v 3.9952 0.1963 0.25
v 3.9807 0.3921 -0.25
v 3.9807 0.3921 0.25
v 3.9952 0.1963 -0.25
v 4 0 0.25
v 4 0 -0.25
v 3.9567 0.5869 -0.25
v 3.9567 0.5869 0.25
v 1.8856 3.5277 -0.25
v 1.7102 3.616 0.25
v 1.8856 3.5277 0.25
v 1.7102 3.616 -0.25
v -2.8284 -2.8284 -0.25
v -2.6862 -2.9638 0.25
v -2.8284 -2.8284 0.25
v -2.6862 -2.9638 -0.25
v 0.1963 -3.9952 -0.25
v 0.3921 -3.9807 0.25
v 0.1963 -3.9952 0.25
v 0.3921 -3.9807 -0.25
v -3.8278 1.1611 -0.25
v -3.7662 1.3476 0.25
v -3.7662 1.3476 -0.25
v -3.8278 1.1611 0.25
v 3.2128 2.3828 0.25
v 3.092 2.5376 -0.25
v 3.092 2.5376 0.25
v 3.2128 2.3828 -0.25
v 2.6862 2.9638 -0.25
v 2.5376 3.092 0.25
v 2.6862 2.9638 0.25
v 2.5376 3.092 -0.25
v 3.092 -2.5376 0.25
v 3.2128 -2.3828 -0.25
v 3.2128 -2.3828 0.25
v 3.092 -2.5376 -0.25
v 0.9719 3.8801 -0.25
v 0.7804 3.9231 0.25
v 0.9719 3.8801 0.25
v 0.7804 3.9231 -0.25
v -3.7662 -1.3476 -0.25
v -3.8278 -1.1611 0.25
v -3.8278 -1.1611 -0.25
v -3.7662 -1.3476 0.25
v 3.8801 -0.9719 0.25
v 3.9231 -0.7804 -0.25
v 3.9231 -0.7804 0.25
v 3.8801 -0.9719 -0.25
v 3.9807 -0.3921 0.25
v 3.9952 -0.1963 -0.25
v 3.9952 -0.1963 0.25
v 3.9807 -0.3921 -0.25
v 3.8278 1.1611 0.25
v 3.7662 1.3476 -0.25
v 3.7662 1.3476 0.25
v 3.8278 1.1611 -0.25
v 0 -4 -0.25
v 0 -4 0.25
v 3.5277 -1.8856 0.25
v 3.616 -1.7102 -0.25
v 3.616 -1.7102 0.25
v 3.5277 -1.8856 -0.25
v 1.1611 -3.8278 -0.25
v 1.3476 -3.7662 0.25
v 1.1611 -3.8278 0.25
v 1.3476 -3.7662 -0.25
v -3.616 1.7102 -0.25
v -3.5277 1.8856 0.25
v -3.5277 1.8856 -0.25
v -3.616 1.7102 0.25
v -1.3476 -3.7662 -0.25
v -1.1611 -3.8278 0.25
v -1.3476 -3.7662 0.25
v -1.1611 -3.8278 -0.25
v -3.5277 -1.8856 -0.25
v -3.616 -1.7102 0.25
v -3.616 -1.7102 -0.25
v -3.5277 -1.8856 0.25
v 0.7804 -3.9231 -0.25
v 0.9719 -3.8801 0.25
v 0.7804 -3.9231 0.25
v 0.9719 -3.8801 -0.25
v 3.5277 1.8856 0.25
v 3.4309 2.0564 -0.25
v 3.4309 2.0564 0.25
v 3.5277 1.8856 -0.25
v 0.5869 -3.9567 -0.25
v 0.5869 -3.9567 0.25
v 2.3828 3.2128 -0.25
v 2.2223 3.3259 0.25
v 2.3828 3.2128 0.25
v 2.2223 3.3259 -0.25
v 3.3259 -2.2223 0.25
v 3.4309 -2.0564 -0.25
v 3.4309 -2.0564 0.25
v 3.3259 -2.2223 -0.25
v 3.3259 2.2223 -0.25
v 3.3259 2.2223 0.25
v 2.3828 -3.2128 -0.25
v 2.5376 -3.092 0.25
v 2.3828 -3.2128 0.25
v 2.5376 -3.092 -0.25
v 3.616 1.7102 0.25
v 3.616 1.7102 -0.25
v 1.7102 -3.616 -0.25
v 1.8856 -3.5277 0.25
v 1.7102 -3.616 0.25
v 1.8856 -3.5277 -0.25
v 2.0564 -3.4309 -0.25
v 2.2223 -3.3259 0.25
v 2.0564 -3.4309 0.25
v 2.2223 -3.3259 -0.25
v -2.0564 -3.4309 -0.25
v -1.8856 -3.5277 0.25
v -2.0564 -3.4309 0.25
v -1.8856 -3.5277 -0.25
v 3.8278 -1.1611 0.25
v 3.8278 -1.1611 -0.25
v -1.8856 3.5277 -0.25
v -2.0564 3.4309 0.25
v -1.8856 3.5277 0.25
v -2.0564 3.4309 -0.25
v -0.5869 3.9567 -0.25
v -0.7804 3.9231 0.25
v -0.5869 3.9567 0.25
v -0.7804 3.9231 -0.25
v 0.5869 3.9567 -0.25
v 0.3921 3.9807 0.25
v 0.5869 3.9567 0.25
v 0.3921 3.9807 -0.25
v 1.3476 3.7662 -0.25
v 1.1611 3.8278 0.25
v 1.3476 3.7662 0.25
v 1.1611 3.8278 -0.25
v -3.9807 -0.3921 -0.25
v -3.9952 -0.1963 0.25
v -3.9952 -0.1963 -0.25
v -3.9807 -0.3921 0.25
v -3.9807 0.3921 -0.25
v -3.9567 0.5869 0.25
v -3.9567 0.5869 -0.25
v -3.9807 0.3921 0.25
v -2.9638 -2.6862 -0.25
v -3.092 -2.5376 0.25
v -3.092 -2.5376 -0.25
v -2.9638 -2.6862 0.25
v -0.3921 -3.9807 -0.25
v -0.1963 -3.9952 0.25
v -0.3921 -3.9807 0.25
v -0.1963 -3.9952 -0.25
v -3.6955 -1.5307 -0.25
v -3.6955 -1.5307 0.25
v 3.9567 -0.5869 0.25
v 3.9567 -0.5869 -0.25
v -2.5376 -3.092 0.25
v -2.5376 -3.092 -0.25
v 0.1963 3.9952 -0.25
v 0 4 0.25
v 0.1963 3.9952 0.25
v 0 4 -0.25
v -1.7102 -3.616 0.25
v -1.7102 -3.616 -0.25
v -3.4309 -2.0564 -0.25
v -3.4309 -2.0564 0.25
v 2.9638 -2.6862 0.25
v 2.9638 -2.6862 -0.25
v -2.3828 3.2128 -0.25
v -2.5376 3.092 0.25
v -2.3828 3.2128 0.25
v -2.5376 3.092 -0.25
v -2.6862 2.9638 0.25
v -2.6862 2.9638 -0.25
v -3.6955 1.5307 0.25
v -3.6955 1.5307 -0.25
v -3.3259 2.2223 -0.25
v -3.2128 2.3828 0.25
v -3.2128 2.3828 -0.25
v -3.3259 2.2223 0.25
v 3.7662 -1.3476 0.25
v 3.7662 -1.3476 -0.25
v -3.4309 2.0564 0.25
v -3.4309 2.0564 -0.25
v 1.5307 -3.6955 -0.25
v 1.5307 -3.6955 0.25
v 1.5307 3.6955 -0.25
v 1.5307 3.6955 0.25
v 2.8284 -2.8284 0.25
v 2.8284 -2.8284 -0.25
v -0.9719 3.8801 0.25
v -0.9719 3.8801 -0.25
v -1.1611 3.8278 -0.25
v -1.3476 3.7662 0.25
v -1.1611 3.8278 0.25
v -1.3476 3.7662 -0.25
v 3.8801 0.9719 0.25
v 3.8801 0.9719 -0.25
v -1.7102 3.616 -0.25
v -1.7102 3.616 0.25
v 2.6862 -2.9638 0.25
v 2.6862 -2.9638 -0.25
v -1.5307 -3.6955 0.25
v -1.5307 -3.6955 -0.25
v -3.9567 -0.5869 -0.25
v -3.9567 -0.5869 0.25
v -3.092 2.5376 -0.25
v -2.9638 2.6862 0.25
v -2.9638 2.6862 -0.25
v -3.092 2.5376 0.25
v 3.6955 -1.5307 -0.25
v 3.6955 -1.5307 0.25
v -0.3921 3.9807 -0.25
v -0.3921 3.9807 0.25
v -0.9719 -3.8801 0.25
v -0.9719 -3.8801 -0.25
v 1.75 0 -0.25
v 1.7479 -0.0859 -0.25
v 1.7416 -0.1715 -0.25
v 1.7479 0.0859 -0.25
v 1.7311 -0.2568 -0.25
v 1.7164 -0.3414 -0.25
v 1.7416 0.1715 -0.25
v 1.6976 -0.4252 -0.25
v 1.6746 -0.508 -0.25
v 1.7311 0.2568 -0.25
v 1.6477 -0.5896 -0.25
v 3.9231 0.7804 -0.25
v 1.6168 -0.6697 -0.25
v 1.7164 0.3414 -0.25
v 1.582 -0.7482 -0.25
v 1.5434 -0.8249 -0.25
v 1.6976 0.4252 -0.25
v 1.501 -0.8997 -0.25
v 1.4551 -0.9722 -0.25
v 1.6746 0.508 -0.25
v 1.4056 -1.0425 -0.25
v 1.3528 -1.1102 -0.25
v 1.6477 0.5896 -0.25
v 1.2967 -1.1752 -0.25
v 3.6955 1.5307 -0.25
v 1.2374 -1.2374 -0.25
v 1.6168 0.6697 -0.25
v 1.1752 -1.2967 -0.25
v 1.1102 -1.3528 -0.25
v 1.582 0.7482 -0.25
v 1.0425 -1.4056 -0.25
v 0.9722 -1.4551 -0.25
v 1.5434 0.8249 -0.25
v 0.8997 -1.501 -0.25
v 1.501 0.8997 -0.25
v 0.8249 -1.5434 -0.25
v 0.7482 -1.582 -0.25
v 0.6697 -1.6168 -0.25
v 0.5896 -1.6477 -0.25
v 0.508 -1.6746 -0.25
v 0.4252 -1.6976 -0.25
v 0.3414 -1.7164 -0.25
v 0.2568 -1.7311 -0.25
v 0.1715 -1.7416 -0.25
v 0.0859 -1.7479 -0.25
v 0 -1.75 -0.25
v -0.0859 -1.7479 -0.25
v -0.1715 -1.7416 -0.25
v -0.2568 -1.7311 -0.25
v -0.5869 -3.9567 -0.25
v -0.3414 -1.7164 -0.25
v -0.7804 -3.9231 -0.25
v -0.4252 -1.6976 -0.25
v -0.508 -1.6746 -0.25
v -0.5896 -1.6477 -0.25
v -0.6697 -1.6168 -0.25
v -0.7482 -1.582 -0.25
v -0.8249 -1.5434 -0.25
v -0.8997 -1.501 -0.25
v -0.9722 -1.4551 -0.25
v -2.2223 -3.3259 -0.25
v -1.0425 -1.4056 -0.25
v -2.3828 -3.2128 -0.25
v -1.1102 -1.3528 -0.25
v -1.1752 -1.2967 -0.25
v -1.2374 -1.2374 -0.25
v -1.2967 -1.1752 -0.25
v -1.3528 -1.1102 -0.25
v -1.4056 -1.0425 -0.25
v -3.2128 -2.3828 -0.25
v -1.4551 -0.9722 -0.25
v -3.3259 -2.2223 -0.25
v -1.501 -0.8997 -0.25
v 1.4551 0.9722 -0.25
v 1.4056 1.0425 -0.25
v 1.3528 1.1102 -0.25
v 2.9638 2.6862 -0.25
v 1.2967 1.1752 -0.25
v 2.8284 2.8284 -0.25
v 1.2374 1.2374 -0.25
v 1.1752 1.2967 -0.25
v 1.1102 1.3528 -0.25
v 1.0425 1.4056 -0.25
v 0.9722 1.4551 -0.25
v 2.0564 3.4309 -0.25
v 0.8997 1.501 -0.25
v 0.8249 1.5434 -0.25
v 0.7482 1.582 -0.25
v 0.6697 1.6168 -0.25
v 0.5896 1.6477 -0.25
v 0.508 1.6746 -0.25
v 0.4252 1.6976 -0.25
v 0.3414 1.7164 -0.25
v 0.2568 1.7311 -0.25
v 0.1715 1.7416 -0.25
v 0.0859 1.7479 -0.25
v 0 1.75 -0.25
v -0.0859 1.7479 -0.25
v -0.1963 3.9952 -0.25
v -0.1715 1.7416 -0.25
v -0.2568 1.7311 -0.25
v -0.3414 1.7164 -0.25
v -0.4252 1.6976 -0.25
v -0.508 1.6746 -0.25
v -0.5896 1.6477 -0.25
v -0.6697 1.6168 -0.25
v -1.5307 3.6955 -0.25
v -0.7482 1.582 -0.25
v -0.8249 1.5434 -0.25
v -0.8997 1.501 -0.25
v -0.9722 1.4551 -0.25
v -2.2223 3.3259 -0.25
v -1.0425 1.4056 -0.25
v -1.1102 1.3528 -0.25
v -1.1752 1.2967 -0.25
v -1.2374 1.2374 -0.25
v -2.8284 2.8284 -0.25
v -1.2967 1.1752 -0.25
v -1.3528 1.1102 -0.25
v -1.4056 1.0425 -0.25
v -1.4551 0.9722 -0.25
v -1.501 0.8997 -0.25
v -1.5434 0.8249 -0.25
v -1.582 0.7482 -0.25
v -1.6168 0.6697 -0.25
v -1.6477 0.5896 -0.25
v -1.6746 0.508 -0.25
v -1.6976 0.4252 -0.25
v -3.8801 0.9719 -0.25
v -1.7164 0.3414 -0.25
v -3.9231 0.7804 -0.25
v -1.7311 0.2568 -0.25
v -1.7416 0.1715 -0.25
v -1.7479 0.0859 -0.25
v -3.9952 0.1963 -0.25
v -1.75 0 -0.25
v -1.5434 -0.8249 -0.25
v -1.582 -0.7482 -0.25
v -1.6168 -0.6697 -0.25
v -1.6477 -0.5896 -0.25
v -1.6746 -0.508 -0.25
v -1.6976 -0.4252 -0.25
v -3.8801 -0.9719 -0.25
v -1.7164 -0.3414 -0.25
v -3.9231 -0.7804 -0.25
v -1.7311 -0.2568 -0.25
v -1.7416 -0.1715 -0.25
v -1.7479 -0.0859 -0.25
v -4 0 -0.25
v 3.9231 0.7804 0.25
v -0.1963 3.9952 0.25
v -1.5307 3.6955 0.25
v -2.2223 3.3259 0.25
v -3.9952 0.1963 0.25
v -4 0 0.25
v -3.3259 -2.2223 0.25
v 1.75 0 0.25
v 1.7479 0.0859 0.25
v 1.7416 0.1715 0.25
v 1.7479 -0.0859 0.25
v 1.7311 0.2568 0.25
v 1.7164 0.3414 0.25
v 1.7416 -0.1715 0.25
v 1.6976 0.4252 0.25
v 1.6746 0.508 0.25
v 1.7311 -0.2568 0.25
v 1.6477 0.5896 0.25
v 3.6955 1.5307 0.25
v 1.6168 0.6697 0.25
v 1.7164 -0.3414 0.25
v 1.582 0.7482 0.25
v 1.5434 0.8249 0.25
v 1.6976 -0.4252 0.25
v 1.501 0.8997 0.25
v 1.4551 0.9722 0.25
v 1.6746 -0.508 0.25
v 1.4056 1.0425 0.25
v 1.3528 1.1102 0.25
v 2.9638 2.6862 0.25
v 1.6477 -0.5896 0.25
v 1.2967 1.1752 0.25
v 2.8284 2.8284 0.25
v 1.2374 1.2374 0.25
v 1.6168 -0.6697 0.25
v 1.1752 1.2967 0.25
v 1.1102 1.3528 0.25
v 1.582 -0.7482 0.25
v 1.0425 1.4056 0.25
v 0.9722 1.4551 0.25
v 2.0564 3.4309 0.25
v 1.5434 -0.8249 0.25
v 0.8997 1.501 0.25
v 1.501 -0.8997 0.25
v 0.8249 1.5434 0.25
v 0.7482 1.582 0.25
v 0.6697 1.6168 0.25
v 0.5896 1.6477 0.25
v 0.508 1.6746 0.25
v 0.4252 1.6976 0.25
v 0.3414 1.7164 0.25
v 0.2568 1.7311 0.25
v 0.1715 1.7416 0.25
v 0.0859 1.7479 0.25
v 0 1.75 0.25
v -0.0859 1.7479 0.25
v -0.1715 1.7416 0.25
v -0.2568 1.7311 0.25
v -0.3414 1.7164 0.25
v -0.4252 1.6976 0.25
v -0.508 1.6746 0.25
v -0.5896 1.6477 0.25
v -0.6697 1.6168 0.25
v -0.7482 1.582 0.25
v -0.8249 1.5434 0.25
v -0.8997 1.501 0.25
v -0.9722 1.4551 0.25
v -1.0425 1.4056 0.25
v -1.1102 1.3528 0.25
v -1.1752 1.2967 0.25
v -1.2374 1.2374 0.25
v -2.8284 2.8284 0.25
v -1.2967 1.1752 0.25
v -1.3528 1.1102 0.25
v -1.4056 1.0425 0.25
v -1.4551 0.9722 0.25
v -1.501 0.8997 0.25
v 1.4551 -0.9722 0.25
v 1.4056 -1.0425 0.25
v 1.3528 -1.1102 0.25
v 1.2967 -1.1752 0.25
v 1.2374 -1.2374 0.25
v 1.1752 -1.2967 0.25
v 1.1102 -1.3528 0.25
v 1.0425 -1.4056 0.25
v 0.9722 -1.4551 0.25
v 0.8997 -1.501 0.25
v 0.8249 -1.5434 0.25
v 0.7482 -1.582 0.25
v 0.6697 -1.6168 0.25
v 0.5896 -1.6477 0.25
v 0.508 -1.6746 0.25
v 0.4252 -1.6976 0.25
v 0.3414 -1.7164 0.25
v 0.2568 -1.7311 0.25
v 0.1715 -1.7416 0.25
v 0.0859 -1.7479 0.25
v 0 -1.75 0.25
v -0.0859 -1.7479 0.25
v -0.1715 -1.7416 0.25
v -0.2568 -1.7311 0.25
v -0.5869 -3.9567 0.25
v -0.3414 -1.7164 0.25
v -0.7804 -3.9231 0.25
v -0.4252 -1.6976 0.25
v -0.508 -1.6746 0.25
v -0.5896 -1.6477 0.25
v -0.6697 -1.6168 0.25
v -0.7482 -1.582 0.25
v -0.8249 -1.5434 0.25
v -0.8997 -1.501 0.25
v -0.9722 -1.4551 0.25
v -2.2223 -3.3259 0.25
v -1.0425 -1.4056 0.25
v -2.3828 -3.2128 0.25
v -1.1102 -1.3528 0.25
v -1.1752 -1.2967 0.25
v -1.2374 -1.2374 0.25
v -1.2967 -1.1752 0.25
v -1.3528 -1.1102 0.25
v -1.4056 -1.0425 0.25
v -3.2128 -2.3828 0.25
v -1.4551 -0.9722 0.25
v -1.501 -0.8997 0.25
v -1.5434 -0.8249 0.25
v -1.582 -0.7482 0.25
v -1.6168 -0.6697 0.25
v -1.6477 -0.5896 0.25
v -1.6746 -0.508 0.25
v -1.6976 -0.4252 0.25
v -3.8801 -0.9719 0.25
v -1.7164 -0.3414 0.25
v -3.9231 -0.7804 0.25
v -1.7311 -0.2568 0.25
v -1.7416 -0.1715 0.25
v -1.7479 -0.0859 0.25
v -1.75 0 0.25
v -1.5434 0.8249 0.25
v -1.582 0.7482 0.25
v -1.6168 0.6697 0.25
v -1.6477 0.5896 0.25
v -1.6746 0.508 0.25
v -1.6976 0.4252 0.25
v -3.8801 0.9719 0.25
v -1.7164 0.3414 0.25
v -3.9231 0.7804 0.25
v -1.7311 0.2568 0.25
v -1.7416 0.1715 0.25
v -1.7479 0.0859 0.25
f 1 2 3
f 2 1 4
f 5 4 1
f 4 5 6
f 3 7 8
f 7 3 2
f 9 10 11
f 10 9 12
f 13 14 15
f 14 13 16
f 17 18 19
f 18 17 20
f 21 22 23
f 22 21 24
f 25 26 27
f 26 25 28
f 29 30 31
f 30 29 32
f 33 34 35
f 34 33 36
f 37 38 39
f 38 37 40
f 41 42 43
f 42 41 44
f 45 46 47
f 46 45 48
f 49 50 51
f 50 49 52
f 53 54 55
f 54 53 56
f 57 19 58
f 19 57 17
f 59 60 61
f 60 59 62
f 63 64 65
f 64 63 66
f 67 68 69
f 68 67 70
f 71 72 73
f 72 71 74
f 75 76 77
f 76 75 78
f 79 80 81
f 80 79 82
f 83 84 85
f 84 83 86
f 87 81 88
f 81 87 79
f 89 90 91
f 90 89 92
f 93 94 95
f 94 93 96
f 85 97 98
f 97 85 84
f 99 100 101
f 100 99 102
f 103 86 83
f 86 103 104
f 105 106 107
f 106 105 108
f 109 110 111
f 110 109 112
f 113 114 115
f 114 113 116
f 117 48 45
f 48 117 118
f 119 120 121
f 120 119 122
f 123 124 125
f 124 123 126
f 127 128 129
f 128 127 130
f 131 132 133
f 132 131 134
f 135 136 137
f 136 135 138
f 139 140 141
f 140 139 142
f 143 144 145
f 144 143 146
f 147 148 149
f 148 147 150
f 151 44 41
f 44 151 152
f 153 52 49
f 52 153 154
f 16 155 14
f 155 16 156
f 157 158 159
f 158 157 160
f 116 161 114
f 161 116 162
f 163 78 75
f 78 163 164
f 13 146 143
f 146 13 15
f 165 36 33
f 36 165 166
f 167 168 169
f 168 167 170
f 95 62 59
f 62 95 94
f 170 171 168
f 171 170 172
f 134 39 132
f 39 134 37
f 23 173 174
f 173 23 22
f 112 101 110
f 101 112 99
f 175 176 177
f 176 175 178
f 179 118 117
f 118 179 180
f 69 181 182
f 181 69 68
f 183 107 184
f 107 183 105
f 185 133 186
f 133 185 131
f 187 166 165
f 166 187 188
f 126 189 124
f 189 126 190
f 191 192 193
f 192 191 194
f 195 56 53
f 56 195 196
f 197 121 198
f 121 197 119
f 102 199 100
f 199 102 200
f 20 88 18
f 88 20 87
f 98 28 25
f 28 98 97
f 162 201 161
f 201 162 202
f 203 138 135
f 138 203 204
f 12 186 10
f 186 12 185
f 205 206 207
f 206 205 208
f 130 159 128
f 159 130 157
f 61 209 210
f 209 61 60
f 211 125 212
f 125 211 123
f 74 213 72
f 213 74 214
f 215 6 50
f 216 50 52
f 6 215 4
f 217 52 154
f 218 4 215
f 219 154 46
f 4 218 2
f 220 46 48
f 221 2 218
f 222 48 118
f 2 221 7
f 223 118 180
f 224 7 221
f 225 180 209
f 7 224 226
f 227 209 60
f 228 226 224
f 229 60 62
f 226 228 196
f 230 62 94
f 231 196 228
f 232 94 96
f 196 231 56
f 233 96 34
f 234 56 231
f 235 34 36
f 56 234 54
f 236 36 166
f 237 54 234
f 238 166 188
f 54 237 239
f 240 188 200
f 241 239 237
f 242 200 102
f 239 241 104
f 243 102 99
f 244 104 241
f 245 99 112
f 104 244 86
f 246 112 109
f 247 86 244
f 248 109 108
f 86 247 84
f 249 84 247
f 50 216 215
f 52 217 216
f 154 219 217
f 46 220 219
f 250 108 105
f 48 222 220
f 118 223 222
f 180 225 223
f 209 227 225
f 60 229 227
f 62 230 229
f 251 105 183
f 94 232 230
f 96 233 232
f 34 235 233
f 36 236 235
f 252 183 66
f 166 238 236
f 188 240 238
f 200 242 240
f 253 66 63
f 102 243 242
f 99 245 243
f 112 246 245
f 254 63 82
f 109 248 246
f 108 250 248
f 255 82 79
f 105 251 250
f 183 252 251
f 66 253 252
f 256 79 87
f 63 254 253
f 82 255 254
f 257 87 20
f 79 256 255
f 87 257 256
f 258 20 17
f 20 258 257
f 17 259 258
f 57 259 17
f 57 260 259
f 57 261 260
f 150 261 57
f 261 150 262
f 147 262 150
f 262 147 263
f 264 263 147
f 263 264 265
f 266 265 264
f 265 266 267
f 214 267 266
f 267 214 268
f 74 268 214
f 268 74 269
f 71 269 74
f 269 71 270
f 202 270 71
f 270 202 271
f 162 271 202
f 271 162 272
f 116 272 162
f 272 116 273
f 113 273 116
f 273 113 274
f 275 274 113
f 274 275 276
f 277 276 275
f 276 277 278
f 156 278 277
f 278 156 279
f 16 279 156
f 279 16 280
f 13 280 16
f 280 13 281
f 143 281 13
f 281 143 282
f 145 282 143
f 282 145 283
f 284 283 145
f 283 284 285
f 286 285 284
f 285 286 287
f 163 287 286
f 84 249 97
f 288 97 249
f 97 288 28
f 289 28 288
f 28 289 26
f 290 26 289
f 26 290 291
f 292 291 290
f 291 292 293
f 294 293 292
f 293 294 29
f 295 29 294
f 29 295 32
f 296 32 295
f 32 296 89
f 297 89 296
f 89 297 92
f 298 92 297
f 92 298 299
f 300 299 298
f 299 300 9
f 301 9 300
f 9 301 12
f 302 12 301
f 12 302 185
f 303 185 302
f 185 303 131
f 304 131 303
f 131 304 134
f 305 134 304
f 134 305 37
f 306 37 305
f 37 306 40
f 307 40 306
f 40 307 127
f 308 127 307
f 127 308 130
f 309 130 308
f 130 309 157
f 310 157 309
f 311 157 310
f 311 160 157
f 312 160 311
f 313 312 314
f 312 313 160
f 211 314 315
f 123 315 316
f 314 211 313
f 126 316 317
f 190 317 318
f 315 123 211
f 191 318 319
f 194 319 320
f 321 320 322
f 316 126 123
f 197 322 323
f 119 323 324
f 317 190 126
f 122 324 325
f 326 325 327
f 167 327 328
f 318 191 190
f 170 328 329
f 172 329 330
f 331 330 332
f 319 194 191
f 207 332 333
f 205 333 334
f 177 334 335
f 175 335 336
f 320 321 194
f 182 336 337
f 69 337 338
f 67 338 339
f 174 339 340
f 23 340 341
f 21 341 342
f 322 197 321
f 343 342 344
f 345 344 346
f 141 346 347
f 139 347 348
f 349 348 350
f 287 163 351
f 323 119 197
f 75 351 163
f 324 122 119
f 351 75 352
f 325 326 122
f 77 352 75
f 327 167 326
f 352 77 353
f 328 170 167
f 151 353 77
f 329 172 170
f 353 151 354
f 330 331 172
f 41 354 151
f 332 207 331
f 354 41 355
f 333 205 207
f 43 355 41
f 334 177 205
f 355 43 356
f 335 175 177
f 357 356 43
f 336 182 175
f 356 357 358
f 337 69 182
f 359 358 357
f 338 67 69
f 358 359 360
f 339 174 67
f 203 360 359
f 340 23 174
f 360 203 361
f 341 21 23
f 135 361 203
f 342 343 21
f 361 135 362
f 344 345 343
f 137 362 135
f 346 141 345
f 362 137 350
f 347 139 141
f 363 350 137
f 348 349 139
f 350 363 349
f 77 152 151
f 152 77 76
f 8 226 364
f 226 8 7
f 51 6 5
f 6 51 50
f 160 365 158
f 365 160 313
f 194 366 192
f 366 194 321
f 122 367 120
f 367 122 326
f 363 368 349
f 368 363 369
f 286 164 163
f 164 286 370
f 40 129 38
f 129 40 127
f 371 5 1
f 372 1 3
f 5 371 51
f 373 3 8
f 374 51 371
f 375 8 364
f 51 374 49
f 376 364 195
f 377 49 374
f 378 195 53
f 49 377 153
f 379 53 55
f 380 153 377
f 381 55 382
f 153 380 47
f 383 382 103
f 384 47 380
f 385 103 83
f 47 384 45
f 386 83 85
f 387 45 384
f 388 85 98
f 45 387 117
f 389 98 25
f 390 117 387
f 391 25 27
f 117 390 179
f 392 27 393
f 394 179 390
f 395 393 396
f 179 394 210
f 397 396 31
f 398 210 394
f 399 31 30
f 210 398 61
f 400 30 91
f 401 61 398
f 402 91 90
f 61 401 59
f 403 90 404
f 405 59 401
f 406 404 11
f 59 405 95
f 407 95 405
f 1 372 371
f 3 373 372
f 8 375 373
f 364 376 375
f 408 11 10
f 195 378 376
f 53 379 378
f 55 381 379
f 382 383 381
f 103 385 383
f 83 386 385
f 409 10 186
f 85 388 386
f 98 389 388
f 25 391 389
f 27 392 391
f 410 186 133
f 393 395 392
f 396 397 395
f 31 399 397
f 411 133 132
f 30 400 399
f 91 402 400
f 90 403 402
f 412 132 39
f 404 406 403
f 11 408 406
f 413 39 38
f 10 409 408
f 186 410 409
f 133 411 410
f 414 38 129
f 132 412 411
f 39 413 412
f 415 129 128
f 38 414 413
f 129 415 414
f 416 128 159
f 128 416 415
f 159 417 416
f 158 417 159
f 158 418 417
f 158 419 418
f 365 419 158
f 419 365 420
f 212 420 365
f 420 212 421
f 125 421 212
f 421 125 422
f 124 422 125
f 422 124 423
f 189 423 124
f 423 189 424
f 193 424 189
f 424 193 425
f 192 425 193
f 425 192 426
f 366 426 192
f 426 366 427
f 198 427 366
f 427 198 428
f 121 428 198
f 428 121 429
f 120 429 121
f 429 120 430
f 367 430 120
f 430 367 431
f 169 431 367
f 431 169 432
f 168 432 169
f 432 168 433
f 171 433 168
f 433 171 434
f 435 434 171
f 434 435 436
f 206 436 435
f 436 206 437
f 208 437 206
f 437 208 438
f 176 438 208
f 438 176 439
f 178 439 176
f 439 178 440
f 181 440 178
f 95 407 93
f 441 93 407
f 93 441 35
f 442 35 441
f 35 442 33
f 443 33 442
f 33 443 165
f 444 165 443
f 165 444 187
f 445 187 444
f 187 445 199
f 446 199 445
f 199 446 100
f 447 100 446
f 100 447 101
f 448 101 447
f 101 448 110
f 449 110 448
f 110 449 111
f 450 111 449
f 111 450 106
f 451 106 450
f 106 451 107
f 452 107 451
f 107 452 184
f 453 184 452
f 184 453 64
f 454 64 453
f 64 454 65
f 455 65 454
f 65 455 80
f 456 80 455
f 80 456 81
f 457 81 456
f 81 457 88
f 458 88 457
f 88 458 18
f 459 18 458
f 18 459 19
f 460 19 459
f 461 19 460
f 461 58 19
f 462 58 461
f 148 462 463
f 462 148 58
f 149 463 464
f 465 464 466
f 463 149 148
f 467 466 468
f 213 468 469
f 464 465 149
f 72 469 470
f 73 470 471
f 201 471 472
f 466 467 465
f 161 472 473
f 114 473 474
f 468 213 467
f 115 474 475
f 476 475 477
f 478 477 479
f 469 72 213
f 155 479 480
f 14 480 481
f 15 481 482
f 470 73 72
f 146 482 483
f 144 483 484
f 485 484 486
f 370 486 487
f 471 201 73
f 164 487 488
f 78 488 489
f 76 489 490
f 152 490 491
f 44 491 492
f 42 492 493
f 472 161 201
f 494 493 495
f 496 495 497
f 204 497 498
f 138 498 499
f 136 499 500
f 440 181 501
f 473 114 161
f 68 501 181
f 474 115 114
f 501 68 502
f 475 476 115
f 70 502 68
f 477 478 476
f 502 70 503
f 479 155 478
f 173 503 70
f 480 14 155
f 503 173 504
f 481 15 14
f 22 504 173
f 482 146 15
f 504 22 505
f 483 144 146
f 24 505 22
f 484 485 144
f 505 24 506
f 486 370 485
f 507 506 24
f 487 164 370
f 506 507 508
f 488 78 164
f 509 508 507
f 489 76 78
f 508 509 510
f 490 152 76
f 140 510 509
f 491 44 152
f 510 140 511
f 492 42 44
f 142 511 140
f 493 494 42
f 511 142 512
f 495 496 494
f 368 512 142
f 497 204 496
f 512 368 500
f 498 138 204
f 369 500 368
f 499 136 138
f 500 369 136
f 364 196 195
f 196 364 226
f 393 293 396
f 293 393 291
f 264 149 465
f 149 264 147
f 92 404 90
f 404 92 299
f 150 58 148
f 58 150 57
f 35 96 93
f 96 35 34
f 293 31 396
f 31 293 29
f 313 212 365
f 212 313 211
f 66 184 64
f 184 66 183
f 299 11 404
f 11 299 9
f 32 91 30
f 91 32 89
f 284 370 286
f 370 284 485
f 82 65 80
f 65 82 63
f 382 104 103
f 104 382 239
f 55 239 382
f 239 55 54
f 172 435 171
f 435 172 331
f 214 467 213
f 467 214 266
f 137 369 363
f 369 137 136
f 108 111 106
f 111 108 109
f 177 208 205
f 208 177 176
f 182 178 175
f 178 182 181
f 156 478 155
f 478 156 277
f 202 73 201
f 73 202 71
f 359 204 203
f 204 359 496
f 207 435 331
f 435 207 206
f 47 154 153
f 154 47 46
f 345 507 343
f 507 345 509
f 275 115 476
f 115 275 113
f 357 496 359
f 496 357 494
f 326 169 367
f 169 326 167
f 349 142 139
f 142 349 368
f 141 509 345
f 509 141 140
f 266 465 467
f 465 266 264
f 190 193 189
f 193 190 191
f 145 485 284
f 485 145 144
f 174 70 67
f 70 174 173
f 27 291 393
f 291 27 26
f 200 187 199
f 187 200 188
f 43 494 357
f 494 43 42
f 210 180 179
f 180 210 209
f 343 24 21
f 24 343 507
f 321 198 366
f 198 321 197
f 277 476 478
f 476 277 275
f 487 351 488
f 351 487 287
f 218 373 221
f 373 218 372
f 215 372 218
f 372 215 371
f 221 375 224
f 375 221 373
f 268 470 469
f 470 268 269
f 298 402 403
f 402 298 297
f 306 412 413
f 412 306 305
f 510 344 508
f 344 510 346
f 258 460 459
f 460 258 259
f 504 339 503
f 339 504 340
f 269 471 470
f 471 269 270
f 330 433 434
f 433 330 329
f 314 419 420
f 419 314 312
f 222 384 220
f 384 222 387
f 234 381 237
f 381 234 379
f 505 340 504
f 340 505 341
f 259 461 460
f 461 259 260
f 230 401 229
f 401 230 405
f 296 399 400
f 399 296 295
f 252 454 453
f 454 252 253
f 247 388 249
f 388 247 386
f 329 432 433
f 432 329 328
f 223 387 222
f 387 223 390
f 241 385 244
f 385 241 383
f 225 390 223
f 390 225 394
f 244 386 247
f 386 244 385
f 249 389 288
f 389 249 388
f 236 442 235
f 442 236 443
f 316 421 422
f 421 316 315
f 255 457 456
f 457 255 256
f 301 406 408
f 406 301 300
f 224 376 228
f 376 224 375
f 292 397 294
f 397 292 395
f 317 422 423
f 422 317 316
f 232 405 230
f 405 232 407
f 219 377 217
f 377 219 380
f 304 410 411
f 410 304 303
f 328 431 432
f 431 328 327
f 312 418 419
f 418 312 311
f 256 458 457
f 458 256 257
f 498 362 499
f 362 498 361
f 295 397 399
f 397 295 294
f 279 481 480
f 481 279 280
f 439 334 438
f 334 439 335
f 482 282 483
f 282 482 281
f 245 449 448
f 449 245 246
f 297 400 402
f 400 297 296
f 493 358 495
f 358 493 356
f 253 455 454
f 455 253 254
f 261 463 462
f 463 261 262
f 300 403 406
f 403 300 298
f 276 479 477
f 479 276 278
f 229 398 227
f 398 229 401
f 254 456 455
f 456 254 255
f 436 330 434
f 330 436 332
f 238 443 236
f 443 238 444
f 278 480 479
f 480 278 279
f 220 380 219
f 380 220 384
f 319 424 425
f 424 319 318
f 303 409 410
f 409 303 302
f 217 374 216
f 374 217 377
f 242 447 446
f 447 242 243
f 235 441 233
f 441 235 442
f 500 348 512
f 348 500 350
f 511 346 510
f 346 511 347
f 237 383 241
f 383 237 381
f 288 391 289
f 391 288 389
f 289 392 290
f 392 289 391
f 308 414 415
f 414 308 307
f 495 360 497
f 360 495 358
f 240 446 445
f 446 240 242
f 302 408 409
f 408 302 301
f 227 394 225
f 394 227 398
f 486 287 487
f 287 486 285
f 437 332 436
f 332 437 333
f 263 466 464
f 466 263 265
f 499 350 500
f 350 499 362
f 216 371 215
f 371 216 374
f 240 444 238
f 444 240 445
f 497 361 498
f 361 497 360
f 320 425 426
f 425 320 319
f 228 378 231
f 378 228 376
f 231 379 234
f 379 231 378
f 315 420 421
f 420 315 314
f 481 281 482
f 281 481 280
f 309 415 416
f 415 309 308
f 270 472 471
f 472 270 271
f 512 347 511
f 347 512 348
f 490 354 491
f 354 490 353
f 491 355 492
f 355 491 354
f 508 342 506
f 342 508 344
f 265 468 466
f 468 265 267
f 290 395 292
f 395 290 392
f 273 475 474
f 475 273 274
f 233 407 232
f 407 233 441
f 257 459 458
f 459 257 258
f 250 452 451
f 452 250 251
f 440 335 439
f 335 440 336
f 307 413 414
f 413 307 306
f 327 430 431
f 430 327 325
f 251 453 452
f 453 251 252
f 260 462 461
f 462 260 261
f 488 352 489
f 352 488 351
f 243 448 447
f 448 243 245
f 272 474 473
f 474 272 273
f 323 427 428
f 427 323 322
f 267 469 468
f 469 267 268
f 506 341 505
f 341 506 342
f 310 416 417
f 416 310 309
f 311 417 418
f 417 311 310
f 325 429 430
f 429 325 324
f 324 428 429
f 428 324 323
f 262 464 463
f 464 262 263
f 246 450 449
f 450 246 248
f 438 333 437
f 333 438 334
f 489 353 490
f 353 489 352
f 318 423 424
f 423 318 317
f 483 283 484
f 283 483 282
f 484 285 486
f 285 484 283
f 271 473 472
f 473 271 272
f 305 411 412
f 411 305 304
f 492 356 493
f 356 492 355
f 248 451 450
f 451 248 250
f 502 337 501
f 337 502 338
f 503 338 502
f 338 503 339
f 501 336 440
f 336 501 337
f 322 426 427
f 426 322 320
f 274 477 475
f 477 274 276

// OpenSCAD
// Flat washer parameters (mm)
inner_hole_diameter_mm = 3.5;  //[1.75:7:0.1]
outer_diameter_mm      = 8.0;  //[4:16:0.1]
thickness_mm           = 0.5;  //[0.25:1:0.05]
eps_mm                 = 0.2;  //[0.05:0.5:0.05]

// Smoothness (avoid faceted look)
$fn = 128;

module washer() {
    difference() {
        cylinder(d=outer_diameter_mm, h=thickness_mm, center=true);
        cylinder(d=inner_hole_diameter_mm, h=thickness_mm + 2*eps_mm, center=true);
    }
}

// ONE connected solid: just the washer
washer();
